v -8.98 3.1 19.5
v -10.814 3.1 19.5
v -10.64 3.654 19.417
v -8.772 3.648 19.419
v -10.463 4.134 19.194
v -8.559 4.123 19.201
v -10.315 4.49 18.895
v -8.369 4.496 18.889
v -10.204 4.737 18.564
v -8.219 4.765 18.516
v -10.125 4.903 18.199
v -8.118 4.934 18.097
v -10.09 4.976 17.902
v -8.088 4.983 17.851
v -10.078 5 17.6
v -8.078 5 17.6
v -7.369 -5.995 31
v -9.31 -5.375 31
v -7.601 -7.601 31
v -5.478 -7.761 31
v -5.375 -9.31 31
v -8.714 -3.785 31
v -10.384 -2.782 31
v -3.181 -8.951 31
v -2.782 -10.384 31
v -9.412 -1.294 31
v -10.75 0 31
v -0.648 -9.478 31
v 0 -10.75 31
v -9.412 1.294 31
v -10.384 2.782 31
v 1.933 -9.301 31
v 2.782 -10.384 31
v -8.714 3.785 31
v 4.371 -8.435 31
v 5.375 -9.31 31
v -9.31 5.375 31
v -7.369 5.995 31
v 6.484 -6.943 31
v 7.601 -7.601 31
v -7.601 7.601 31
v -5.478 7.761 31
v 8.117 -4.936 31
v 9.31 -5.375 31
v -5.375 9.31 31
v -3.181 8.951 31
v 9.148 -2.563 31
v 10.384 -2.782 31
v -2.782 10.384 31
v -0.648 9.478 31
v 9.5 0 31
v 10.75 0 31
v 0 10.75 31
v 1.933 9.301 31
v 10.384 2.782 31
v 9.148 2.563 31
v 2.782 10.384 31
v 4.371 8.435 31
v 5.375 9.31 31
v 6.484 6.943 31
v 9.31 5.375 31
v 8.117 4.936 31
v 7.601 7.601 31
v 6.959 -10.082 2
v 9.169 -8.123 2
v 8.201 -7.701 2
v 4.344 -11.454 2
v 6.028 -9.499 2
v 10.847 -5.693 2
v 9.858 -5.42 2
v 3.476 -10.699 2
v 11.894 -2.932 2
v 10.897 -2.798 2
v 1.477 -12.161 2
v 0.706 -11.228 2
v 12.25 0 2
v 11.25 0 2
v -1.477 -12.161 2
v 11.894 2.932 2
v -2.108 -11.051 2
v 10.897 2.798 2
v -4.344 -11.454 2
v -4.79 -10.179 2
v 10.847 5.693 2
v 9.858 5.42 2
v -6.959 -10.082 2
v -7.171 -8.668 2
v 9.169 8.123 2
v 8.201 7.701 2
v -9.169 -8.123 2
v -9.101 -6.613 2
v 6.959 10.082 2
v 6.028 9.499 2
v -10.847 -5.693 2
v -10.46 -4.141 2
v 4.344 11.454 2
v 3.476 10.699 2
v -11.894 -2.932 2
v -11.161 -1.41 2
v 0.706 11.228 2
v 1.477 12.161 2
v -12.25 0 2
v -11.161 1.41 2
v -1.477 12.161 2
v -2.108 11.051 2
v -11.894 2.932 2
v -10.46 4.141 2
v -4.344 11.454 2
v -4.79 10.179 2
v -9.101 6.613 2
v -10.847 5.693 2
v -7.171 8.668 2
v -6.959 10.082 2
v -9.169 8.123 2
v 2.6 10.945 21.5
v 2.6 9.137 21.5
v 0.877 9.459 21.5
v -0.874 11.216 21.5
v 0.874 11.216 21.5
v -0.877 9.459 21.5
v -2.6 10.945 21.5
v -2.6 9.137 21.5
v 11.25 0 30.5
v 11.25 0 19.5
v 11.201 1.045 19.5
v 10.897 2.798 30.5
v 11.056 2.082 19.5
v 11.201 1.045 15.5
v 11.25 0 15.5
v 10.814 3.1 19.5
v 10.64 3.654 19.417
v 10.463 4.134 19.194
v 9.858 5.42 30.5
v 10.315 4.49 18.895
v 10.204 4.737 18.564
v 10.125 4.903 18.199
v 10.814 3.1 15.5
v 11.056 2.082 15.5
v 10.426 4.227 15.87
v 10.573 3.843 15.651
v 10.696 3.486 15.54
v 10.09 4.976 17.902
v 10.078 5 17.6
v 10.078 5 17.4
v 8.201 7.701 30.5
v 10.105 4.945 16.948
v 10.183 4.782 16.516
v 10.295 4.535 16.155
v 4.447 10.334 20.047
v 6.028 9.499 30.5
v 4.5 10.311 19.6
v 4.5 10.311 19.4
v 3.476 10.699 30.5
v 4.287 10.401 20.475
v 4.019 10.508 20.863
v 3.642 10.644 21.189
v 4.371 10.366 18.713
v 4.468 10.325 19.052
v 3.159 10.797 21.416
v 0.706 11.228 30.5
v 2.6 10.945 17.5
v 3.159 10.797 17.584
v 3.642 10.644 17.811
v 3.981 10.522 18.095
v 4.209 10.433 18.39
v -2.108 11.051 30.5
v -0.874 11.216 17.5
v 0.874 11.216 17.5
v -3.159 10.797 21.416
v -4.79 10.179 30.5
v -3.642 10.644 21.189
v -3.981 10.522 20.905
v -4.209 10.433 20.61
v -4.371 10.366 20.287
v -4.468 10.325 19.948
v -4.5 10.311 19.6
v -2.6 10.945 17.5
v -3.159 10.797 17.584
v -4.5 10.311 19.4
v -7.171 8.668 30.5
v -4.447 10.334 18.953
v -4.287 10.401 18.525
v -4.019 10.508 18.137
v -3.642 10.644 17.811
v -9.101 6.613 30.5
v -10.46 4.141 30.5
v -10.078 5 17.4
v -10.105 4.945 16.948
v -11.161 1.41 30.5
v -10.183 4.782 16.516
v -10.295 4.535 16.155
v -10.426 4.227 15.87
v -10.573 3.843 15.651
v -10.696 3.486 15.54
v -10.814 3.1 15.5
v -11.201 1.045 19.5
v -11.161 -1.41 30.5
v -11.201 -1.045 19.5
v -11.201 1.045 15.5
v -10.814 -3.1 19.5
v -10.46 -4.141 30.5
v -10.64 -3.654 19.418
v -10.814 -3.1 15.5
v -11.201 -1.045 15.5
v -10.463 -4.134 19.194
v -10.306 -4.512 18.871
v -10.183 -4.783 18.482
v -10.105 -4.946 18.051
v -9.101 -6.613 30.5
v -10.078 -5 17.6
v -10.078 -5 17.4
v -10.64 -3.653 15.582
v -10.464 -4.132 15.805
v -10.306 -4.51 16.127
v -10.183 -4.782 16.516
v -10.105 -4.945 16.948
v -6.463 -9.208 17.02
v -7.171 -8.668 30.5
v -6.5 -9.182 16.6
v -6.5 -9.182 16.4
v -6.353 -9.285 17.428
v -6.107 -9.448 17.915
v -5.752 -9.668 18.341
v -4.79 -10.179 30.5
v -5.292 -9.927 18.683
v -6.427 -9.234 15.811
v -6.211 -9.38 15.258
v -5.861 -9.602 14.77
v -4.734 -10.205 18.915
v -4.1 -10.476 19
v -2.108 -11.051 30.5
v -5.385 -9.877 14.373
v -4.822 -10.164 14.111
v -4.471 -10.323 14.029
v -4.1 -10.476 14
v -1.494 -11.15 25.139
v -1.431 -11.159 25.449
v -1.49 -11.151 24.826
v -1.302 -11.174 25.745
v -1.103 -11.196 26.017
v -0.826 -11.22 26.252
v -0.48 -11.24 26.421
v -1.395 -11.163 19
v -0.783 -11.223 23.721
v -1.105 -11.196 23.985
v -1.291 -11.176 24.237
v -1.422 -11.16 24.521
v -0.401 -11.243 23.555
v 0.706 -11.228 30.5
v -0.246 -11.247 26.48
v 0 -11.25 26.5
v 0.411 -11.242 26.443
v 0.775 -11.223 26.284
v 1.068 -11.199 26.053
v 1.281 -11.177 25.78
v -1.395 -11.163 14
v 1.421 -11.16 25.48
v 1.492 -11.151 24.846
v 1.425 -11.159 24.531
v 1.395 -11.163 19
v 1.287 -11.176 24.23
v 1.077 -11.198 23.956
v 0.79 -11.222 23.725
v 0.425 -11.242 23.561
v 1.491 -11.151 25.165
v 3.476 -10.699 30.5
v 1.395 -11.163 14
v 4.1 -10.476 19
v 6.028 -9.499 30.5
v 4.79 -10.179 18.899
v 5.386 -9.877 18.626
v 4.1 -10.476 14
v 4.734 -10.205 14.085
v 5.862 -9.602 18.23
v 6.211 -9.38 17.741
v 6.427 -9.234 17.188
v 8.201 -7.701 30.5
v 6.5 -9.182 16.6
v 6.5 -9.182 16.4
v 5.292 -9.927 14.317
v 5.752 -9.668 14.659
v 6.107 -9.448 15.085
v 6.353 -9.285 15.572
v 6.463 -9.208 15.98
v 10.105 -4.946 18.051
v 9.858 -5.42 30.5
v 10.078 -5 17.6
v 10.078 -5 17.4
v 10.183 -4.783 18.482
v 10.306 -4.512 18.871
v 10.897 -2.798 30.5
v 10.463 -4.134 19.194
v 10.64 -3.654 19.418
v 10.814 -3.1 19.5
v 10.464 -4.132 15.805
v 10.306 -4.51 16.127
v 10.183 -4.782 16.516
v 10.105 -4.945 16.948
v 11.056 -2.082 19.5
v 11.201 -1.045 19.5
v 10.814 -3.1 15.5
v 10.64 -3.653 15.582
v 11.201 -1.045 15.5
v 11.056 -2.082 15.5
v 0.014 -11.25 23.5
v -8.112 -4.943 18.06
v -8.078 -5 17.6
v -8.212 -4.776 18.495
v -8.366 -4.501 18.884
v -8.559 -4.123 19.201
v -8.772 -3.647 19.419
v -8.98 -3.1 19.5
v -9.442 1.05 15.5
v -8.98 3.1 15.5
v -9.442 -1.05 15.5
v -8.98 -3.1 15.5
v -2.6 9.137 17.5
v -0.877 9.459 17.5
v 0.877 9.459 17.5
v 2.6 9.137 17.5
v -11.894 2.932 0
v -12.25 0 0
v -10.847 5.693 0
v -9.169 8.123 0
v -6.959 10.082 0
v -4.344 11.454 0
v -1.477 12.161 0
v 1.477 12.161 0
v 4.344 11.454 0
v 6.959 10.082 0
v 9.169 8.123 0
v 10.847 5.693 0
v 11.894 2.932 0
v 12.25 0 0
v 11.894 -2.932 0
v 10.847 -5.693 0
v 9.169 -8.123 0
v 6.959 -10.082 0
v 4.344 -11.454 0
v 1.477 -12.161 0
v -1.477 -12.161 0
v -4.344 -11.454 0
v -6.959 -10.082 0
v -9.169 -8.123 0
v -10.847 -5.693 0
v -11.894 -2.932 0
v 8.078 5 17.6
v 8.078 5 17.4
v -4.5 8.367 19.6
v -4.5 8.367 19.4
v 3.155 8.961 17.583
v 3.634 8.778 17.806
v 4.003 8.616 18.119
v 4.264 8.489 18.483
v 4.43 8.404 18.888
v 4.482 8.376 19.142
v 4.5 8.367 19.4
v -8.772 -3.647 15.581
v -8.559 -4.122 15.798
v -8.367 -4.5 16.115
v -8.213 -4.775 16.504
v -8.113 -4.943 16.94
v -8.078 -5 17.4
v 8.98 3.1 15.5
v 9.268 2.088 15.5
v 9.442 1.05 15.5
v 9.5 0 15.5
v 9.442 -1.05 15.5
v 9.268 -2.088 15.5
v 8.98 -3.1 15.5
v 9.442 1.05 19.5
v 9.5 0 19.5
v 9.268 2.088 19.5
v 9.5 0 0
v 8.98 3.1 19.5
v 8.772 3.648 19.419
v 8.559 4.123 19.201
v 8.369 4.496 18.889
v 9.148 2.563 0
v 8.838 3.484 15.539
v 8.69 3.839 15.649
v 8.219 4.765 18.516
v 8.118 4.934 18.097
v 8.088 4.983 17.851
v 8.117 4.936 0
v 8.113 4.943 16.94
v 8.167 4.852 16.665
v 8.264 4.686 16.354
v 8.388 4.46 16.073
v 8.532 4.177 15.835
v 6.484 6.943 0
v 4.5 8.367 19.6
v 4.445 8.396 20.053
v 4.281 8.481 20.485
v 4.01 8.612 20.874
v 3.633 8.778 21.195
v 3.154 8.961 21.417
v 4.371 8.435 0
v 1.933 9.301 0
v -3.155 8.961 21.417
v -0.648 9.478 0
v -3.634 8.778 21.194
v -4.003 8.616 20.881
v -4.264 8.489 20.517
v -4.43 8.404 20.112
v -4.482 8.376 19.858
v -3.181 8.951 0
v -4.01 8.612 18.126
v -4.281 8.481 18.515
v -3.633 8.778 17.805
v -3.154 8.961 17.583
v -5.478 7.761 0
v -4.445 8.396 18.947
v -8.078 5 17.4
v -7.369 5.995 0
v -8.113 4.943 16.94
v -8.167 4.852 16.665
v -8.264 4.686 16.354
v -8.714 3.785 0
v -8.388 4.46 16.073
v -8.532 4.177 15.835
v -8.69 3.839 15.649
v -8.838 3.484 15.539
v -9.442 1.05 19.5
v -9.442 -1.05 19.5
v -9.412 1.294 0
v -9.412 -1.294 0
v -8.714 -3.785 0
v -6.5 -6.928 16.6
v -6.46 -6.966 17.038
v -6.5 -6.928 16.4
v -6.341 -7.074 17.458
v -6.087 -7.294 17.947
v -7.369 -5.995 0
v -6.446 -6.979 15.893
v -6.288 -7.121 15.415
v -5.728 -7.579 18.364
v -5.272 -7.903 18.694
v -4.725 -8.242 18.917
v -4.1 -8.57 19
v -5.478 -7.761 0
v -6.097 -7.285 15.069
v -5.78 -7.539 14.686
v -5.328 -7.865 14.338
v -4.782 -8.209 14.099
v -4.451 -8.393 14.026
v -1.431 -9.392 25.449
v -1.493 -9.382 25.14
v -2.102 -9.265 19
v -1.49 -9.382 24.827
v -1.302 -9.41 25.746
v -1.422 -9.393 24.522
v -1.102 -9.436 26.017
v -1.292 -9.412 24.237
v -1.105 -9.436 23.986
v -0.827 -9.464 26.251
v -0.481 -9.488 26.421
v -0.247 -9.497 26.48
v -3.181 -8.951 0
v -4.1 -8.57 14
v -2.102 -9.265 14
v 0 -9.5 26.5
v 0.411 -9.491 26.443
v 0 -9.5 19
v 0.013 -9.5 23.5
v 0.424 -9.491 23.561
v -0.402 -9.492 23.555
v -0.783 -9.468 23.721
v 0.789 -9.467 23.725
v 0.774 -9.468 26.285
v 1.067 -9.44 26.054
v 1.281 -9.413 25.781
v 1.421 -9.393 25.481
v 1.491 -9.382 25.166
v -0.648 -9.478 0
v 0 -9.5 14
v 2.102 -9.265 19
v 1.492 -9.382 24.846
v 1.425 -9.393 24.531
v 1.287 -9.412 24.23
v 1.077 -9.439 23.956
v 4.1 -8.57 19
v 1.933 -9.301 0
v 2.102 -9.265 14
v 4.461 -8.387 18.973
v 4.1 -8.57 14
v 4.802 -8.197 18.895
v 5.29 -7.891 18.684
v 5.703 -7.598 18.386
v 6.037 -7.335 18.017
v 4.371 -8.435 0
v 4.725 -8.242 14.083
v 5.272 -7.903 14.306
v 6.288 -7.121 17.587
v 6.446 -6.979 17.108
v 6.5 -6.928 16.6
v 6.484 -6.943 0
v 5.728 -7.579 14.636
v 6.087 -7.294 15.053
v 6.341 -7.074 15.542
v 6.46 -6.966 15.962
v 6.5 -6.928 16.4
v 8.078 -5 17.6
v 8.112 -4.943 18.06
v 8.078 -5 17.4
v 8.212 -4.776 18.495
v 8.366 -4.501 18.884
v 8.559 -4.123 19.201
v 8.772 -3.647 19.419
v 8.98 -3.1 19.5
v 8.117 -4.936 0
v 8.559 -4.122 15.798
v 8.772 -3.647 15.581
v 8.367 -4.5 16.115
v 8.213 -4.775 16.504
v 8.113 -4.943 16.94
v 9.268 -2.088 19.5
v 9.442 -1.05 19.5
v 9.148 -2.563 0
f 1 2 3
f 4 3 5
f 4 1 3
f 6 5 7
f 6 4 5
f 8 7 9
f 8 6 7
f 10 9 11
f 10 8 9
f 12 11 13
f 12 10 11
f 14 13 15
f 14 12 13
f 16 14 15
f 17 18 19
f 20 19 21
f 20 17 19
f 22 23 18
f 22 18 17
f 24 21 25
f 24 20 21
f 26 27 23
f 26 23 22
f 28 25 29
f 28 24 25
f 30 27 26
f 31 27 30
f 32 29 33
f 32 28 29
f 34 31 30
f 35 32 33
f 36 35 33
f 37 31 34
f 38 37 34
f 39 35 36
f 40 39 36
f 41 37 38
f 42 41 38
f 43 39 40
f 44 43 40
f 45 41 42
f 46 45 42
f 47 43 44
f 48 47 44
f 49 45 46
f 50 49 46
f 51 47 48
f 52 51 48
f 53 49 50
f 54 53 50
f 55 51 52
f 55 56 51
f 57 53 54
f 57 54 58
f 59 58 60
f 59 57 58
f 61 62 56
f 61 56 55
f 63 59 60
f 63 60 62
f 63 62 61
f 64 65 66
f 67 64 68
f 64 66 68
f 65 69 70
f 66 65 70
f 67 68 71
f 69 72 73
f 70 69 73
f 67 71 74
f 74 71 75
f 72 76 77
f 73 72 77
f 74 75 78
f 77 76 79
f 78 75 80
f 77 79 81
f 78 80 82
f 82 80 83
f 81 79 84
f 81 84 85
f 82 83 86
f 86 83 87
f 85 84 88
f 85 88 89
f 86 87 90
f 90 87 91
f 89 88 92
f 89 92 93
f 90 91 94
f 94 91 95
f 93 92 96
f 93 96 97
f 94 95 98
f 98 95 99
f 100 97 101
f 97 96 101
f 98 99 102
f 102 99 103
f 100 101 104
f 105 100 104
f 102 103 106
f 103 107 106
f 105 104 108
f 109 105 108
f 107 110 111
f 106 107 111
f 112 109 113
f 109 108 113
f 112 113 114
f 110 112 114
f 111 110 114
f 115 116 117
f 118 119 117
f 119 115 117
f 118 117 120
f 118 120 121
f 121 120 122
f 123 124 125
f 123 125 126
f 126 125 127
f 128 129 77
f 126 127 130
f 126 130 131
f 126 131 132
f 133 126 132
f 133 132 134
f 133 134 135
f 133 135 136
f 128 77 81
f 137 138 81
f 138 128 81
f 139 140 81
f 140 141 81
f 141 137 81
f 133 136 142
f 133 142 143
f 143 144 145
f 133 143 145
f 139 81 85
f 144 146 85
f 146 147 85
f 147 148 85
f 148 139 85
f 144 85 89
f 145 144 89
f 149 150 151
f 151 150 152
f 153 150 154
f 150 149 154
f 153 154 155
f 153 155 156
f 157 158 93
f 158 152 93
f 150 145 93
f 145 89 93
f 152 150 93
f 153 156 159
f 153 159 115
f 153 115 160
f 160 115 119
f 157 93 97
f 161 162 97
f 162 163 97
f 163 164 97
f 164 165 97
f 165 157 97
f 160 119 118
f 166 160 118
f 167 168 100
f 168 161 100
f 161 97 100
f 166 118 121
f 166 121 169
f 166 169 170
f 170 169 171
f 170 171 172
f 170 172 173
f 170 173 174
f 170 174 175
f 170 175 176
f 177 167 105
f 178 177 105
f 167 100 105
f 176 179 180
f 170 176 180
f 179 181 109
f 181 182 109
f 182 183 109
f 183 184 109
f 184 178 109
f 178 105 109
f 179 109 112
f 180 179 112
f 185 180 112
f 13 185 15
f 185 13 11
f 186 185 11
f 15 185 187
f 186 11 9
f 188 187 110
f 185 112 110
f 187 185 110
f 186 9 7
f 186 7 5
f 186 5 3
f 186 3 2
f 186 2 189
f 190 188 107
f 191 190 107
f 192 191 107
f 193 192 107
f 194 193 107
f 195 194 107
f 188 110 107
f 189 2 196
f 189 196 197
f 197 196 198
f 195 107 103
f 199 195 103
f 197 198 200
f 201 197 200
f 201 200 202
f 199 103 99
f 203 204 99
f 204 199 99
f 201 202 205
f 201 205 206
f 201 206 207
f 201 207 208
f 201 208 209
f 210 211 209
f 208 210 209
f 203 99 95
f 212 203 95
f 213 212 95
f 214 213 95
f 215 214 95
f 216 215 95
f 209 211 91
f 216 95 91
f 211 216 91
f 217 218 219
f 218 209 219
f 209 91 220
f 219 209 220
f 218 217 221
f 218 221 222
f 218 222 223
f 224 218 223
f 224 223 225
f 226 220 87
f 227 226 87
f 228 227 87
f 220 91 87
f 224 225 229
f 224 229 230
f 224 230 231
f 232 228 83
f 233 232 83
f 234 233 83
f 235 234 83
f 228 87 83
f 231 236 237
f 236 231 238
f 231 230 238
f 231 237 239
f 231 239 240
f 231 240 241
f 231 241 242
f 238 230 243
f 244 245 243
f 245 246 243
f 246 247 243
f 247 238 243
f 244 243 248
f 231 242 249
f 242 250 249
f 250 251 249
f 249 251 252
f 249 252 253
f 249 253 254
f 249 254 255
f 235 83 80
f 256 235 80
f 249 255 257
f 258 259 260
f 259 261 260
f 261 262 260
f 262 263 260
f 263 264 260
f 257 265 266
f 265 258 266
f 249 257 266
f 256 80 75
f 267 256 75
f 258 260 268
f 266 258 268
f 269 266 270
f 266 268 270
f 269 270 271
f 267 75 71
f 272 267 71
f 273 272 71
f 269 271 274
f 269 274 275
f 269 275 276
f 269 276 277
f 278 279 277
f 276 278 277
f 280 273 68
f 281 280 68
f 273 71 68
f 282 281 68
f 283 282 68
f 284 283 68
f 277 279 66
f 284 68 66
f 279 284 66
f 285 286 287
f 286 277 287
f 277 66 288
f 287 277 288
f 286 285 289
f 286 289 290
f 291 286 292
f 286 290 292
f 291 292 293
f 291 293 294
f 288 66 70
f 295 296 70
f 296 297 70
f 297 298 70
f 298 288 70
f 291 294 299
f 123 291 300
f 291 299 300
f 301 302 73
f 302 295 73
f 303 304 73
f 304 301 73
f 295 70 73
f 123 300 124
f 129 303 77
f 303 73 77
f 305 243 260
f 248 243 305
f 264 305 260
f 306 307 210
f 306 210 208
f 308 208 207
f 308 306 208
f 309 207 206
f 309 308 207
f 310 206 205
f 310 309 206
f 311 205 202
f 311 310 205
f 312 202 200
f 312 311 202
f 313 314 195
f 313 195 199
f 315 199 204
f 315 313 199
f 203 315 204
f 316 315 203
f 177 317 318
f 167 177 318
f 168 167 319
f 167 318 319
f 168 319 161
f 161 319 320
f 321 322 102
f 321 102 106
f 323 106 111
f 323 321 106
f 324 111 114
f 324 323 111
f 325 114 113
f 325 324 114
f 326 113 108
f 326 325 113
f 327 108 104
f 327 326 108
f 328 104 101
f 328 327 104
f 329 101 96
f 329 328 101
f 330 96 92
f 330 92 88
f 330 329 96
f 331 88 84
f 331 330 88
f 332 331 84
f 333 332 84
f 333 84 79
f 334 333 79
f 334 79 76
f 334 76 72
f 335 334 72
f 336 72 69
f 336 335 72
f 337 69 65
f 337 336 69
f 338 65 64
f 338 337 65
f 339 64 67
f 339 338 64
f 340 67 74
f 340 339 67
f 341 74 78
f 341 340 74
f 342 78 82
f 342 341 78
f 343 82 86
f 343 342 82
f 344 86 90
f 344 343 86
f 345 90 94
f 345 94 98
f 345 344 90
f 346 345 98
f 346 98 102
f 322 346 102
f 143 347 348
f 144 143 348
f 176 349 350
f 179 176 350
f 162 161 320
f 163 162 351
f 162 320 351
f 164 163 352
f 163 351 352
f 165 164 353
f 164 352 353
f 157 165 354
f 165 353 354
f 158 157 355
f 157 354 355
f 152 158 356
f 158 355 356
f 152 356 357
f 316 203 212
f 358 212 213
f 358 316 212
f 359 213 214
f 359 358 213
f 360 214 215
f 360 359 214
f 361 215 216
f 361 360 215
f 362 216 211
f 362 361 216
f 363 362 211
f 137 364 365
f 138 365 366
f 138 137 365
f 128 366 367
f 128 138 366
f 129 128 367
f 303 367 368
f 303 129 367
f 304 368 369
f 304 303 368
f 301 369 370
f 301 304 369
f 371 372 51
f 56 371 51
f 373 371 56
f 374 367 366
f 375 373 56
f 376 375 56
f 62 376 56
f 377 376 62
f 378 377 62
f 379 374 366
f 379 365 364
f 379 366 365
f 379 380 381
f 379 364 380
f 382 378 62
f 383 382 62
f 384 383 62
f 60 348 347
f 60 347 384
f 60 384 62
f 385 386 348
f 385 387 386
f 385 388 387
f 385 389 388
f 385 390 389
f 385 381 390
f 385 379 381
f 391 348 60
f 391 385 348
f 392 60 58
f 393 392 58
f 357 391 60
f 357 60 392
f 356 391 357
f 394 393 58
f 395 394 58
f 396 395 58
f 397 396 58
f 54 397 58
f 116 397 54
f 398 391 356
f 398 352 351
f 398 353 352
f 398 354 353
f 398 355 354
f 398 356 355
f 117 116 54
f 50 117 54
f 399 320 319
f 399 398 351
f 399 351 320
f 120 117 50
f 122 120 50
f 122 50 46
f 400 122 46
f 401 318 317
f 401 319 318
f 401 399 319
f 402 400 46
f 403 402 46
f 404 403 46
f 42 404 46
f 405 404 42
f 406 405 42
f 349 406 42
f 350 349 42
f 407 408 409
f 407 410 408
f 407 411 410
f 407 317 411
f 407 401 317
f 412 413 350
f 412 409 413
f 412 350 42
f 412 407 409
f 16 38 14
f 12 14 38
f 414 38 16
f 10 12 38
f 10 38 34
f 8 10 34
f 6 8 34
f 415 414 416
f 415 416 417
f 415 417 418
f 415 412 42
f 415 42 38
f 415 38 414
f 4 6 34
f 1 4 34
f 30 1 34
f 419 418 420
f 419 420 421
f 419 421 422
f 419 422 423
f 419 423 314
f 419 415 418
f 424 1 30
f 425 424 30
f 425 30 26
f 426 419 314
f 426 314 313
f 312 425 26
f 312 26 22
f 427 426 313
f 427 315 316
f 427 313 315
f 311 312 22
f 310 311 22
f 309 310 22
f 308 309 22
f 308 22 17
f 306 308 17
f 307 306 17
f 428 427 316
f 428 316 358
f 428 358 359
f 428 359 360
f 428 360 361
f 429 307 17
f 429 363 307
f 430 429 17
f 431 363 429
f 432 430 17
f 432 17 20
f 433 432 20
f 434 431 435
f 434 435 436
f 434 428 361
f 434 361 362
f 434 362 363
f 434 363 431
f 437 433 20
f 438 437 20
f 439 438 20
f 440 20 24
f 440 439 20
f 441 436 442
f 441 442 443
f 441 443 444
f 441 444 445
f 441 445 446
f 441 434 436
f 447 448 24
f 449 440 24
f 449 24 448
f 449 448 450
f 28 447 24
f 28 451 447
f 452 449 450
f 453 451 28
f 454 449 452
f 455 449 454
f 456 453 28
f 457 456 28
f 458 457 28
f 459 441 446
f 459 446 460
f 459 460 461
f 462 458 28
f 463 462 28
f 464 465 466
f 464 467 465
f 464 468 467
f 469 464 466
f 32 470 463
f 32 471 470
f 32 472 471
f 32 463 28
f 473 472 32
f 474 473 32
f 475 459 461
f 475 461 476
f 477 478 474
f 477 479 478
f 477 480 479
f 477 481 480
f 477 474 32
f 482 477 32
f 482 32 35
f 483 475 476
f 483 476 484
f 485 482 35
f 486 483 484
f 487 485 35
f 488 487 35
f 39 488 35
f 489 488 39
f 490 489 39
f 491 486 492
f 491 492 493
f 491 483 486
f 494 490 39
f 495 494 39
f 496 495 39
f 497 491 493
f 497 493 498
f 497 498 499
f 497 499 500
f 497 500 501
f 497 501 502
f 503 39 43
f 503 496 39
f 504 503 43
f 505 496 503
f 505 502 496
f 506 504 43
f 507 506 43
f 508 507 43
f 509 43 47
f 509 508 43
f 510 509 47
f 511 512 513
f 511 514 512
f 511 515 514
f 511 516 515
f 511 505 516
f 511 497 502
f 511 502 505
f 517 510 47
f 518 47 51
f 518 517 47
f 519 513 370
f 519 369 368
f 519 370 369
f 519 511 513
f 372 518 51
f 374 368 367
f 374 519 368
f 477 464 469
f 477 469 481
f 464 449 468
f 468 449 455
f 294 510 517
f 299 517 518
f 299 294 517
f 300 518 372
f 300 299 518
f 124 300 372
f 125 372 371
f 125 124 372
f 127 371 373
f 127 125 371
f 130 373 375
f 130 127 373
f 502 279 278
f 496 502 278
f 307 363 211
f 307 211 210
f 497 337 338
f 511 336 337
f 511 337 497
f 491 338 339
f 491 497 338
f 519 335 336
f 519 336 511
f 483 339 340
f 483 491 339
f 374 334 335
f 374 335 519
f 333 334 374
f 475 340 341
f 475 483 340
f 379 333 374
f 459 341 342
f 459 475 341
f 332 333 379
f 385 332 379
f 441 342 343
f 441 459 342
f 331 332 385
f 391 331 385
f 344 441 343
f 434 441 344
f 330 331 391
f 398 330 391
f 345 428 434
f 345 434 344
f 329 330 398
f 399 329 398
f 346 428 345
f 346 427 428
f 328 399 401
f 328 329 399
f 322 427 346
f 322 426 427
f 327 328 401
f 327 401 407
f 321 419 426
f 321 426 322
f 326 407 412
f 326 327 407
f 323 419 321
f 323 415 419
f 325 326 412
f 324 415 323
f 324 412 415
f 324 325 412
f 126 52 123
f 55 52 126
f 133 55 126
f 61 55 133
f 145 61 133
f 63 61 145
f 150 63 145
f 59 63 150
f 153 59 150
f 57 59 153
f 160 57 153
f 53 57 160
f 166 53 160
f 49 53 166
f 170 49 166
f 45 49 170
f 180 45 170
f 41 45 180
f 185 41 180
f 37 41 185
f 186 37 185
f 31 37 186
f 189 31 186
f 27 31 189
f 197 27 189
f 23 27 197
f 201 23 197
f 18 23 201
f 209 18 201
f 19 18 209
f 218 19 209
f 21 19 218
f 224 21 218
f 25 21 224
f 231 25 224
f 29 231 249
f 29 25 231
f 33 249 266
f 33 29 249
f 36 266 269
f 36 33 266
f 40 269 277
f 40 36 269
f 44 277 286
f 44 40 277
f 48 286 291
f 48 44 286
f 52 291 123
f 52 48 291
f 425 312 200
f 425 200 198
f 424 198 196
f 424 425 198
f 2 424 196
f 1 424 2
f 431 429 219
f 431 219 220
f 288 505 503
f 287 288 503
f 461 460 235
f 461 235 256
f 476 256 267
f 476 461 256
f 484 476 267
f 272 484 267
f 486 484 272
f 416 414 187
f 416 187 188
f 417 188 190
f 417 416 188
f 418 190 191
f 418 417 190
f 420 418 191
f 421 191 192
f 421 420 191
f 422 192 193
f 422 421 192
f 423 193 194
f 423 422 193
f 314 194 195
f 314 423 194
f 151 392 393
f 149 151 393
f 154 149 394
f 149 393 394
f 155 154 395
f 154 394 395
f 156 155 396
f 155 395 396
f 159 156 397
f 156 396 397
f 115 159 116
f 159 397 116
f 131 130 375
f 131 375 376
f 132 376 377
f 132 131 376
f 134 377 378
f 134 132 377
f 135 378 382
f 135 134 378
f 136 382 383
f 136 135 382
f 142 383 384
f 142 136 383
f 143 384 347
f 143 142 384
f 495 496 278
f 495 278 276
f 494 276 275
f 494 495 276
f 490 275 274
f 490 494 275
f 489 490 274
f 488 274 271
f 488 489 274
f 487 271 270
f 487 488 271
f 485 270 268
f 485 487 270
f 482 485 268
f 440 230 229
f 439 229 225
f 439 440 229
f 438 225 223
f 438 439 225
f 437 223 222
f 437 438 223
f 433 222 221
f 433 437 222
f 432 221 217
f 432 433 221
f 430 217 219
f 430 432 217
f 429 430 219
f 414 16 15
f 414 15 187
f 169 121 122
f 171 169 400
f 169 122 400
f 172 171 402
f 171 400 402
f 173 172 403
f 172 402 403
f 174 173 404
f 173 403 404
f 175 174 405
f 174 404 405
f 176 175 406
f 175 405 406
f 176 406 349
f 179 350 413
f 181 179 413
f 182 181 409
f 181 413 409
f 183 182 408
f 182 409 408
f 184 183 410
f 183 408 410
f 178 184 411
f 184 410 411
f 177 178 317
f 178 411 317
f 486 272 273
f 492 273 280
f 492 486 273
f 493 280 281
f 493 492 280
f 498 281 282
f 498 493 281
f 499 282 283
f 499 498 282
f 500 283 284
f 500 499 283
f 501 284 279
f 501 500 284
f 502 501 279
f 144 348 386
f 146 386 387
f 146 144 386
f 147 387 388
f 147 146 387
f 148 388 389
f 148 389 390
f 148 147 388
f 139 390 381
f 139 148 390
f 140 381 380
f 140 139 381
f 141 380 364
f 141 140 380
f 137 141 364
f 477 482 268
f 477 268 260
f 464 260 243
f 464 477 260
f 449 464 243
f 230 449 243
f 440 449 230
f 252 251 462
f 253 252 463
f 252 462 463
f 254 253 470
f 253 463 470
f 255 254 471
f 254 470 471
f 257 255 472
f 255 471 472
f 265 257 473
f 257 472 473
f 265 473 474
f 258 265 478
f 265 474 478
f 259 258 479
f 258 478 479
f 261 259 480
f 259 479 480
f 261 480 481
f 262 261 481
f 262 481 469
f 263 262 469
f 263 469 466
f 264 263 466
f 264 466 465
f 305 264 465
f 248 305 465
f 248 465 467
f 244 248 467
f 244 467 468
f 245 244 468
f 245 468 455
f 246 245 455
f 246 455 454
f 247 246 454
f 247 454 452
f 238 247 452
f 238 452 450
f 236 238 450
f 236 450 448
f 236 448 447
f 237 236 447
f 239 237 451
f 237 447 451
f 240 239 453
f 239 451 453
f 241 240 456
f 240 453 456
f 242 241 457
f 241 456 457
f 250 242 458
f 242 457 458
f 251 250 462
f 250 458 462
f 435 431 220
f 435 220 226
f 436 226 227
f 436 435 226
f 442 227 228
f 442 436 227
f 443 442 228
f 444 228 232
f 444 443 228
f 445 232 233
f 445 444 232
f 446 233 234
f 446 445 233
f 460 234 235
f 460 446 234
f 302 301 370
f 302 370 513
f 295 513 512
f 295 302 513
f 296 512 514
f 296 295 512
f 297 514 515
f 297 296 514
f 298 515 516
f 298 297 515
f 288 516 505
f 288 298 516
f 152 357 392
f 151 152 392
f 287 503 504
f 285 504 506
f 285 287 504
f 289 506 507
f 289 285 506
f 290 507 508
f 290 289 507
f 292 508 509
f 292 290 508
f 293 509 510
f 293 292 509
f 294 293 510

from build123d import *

# Parameters (mm, degrees)
ESQUISSE1_R             = 11.25
ESQUISSE1_R_2           = 9.5
BASE_EXTRUSION_DEPTH    = 31
CHANFREIN1_SIZE         = 0.5
ESQUISSE2_R             = 12.25
ESQUISSE2_R_2           = 11.25
BOSS_EXTRU_MINCE1_DEPTH = 2
ESQUISSE3_R             = 1.5
ENL_V_MAT_EXTRU_1_DEPTH = 36.512321805
ENL_V_MAT_EXTRU_2_DEPTH = 25
ENL_V_MAT_EXTRU_3_DEPTH = 50


with BuildPart() as part:
    # Esquisse1 → Base-Extrusion (new body)
    with BuildSketch(Plane.XY):
        Circle(ESQUISSE1_R)
        Circle(ESQUISSE1_R_2, mode=Mode.SUBTRACT)
    extrude(amount=BASE_EXTRUSION_DEPTH)

    # Chanfrein1
    chanfrein1_edges = [part.edges().sort_by_distance(p)[0] for p in [
        (-11.25, 0, 31),
    ]]
    chamfer(chanfrein1_edges, length=CHANFREIN1_SIZE)

    # Esquisse2 → Boss.-Extru.-Mince1 (add)
    with BuildSketch(Plane(origin=(0, 0, 0), x_dir=(-1, 0, 0), z_dir=(0, 0, -1))):
        Circle(ESQUISSE2_R)
        Circle(ESQUISSE2_R_2, mode=Mode.SUBTRACT)
    extrude(amount=-BOSS_EXTRU_MINCE1_DEPTH)

    # Esquisse3 → Enlèv. mat.-Extru.1 (cut, through all)
    with BuildSketch(Plane(origin=(0, 0, 0), x_dir=(1, 0, 0), z_dir=(0, 1, 0))):
        with Locations(Location((0, -25, 0), (0, 0, 270))):
            Circle(ESQUISSE3_R)
        with BuildLine():
            Line((-4.1, -14), (4.1, -14))
            ThreePointArc((4.1, -14), (5.797056275, -14.702943725), (6.5, -16.4))
            Line((6.5, -16.4), (6.5, -16.6))
            ThreePointArc((6.5, -16.6), (5.797056275, -18.297056275), (4.1, -19))
            Line((4.1, -19), (-4.1, -19))
            ThreePointArc((-4.1, -19), (-5.797056275, -18.297056275), (-6.5, -16.6))
            Line((-6.5, -16.6), (-6.5, -16.4))
            ThreePointArc((-6.5, -16.4), (-5.797056275, -14.702943725), (-4.1, -14))
        make_face()
    extrude(amount=-ENL_V_MAT_EXTRU_1_DEPTH, mode=Mode.SUBTRACT)

    # Esquisse4 → Enlèv. mat.-Extru.2 (cut, symmetric)
    with BuildSketch(Plane(origin=(0, 0, 0), x_dir=(0, 0, -1), z_dir=(1, 0, 0))):
        with BuildLine():
            Line((-17.6, 5), (-17.4, 5))
            ThreePointArc((-17.4, 5), (-16.056497116, 4.443502884), (-15.5, 3.1))
            Line((-15.5, 3.1), (-15.5, -3.1))
            ThreePointArc((-15.5, -3.1), (-16.056497116, -4.443502884), (-17.4, -5))
            Line((-17.4, -5), (-17.6, -5))
            ThreePointArc((-17.6, -5), (-18.943502884, -4.443502884), (-19.5, -3.1))
            Line((-19.5, -3.1), (-19.5, 3.1))
            ThreePointArc((-19.5, 3.1), (-18.943502884, 4.443502884), (-17.6, 5))
        make_face()
    extrude(amount=ENL_V_MAT_EXTRU_2_DEPTH, both=True, mode=Mode.SUBTRACT)

    # Esquisse5 → Enlèv. mat.-Extru.3 (cut)
    with BuildSketch(Plane(origin=(0, 0, 0), x_dir=(1, 0, 0), z_dir=(0, 1, 0))):
        with BuildLine():
            Line((-2.6, -17.5), (2.6, -17.5))
            ThreePointArc((2.6, -17.5), (3.943502884, -18.056497116), (4.5, -19.4))
            Line((4.5, -19.4), (4.5, -19.6))
            ThreePointArc((4.5, -19.6), (3.943502884, -20.943502884), (2.6, -21.5))
            Line((2.6, -21.5), (-2.6, -21.5))
            ThreePointArc((-2.6, -21.5), (-3.943502884, -20.943502884), (-4.5, -19.6))
            Line((-4.5, -19.6), (-4.5, -19.4))
            ThreePointArc((-4.5, -19.4), (-3.943502884, -18.056497116), (-2.6, -17.5))
        make_face()
    extrude(amount=ENL_V_MAT_EXTRU_3_DEPTH, mode=Mode.SUBTRACT)


solid = part.part
